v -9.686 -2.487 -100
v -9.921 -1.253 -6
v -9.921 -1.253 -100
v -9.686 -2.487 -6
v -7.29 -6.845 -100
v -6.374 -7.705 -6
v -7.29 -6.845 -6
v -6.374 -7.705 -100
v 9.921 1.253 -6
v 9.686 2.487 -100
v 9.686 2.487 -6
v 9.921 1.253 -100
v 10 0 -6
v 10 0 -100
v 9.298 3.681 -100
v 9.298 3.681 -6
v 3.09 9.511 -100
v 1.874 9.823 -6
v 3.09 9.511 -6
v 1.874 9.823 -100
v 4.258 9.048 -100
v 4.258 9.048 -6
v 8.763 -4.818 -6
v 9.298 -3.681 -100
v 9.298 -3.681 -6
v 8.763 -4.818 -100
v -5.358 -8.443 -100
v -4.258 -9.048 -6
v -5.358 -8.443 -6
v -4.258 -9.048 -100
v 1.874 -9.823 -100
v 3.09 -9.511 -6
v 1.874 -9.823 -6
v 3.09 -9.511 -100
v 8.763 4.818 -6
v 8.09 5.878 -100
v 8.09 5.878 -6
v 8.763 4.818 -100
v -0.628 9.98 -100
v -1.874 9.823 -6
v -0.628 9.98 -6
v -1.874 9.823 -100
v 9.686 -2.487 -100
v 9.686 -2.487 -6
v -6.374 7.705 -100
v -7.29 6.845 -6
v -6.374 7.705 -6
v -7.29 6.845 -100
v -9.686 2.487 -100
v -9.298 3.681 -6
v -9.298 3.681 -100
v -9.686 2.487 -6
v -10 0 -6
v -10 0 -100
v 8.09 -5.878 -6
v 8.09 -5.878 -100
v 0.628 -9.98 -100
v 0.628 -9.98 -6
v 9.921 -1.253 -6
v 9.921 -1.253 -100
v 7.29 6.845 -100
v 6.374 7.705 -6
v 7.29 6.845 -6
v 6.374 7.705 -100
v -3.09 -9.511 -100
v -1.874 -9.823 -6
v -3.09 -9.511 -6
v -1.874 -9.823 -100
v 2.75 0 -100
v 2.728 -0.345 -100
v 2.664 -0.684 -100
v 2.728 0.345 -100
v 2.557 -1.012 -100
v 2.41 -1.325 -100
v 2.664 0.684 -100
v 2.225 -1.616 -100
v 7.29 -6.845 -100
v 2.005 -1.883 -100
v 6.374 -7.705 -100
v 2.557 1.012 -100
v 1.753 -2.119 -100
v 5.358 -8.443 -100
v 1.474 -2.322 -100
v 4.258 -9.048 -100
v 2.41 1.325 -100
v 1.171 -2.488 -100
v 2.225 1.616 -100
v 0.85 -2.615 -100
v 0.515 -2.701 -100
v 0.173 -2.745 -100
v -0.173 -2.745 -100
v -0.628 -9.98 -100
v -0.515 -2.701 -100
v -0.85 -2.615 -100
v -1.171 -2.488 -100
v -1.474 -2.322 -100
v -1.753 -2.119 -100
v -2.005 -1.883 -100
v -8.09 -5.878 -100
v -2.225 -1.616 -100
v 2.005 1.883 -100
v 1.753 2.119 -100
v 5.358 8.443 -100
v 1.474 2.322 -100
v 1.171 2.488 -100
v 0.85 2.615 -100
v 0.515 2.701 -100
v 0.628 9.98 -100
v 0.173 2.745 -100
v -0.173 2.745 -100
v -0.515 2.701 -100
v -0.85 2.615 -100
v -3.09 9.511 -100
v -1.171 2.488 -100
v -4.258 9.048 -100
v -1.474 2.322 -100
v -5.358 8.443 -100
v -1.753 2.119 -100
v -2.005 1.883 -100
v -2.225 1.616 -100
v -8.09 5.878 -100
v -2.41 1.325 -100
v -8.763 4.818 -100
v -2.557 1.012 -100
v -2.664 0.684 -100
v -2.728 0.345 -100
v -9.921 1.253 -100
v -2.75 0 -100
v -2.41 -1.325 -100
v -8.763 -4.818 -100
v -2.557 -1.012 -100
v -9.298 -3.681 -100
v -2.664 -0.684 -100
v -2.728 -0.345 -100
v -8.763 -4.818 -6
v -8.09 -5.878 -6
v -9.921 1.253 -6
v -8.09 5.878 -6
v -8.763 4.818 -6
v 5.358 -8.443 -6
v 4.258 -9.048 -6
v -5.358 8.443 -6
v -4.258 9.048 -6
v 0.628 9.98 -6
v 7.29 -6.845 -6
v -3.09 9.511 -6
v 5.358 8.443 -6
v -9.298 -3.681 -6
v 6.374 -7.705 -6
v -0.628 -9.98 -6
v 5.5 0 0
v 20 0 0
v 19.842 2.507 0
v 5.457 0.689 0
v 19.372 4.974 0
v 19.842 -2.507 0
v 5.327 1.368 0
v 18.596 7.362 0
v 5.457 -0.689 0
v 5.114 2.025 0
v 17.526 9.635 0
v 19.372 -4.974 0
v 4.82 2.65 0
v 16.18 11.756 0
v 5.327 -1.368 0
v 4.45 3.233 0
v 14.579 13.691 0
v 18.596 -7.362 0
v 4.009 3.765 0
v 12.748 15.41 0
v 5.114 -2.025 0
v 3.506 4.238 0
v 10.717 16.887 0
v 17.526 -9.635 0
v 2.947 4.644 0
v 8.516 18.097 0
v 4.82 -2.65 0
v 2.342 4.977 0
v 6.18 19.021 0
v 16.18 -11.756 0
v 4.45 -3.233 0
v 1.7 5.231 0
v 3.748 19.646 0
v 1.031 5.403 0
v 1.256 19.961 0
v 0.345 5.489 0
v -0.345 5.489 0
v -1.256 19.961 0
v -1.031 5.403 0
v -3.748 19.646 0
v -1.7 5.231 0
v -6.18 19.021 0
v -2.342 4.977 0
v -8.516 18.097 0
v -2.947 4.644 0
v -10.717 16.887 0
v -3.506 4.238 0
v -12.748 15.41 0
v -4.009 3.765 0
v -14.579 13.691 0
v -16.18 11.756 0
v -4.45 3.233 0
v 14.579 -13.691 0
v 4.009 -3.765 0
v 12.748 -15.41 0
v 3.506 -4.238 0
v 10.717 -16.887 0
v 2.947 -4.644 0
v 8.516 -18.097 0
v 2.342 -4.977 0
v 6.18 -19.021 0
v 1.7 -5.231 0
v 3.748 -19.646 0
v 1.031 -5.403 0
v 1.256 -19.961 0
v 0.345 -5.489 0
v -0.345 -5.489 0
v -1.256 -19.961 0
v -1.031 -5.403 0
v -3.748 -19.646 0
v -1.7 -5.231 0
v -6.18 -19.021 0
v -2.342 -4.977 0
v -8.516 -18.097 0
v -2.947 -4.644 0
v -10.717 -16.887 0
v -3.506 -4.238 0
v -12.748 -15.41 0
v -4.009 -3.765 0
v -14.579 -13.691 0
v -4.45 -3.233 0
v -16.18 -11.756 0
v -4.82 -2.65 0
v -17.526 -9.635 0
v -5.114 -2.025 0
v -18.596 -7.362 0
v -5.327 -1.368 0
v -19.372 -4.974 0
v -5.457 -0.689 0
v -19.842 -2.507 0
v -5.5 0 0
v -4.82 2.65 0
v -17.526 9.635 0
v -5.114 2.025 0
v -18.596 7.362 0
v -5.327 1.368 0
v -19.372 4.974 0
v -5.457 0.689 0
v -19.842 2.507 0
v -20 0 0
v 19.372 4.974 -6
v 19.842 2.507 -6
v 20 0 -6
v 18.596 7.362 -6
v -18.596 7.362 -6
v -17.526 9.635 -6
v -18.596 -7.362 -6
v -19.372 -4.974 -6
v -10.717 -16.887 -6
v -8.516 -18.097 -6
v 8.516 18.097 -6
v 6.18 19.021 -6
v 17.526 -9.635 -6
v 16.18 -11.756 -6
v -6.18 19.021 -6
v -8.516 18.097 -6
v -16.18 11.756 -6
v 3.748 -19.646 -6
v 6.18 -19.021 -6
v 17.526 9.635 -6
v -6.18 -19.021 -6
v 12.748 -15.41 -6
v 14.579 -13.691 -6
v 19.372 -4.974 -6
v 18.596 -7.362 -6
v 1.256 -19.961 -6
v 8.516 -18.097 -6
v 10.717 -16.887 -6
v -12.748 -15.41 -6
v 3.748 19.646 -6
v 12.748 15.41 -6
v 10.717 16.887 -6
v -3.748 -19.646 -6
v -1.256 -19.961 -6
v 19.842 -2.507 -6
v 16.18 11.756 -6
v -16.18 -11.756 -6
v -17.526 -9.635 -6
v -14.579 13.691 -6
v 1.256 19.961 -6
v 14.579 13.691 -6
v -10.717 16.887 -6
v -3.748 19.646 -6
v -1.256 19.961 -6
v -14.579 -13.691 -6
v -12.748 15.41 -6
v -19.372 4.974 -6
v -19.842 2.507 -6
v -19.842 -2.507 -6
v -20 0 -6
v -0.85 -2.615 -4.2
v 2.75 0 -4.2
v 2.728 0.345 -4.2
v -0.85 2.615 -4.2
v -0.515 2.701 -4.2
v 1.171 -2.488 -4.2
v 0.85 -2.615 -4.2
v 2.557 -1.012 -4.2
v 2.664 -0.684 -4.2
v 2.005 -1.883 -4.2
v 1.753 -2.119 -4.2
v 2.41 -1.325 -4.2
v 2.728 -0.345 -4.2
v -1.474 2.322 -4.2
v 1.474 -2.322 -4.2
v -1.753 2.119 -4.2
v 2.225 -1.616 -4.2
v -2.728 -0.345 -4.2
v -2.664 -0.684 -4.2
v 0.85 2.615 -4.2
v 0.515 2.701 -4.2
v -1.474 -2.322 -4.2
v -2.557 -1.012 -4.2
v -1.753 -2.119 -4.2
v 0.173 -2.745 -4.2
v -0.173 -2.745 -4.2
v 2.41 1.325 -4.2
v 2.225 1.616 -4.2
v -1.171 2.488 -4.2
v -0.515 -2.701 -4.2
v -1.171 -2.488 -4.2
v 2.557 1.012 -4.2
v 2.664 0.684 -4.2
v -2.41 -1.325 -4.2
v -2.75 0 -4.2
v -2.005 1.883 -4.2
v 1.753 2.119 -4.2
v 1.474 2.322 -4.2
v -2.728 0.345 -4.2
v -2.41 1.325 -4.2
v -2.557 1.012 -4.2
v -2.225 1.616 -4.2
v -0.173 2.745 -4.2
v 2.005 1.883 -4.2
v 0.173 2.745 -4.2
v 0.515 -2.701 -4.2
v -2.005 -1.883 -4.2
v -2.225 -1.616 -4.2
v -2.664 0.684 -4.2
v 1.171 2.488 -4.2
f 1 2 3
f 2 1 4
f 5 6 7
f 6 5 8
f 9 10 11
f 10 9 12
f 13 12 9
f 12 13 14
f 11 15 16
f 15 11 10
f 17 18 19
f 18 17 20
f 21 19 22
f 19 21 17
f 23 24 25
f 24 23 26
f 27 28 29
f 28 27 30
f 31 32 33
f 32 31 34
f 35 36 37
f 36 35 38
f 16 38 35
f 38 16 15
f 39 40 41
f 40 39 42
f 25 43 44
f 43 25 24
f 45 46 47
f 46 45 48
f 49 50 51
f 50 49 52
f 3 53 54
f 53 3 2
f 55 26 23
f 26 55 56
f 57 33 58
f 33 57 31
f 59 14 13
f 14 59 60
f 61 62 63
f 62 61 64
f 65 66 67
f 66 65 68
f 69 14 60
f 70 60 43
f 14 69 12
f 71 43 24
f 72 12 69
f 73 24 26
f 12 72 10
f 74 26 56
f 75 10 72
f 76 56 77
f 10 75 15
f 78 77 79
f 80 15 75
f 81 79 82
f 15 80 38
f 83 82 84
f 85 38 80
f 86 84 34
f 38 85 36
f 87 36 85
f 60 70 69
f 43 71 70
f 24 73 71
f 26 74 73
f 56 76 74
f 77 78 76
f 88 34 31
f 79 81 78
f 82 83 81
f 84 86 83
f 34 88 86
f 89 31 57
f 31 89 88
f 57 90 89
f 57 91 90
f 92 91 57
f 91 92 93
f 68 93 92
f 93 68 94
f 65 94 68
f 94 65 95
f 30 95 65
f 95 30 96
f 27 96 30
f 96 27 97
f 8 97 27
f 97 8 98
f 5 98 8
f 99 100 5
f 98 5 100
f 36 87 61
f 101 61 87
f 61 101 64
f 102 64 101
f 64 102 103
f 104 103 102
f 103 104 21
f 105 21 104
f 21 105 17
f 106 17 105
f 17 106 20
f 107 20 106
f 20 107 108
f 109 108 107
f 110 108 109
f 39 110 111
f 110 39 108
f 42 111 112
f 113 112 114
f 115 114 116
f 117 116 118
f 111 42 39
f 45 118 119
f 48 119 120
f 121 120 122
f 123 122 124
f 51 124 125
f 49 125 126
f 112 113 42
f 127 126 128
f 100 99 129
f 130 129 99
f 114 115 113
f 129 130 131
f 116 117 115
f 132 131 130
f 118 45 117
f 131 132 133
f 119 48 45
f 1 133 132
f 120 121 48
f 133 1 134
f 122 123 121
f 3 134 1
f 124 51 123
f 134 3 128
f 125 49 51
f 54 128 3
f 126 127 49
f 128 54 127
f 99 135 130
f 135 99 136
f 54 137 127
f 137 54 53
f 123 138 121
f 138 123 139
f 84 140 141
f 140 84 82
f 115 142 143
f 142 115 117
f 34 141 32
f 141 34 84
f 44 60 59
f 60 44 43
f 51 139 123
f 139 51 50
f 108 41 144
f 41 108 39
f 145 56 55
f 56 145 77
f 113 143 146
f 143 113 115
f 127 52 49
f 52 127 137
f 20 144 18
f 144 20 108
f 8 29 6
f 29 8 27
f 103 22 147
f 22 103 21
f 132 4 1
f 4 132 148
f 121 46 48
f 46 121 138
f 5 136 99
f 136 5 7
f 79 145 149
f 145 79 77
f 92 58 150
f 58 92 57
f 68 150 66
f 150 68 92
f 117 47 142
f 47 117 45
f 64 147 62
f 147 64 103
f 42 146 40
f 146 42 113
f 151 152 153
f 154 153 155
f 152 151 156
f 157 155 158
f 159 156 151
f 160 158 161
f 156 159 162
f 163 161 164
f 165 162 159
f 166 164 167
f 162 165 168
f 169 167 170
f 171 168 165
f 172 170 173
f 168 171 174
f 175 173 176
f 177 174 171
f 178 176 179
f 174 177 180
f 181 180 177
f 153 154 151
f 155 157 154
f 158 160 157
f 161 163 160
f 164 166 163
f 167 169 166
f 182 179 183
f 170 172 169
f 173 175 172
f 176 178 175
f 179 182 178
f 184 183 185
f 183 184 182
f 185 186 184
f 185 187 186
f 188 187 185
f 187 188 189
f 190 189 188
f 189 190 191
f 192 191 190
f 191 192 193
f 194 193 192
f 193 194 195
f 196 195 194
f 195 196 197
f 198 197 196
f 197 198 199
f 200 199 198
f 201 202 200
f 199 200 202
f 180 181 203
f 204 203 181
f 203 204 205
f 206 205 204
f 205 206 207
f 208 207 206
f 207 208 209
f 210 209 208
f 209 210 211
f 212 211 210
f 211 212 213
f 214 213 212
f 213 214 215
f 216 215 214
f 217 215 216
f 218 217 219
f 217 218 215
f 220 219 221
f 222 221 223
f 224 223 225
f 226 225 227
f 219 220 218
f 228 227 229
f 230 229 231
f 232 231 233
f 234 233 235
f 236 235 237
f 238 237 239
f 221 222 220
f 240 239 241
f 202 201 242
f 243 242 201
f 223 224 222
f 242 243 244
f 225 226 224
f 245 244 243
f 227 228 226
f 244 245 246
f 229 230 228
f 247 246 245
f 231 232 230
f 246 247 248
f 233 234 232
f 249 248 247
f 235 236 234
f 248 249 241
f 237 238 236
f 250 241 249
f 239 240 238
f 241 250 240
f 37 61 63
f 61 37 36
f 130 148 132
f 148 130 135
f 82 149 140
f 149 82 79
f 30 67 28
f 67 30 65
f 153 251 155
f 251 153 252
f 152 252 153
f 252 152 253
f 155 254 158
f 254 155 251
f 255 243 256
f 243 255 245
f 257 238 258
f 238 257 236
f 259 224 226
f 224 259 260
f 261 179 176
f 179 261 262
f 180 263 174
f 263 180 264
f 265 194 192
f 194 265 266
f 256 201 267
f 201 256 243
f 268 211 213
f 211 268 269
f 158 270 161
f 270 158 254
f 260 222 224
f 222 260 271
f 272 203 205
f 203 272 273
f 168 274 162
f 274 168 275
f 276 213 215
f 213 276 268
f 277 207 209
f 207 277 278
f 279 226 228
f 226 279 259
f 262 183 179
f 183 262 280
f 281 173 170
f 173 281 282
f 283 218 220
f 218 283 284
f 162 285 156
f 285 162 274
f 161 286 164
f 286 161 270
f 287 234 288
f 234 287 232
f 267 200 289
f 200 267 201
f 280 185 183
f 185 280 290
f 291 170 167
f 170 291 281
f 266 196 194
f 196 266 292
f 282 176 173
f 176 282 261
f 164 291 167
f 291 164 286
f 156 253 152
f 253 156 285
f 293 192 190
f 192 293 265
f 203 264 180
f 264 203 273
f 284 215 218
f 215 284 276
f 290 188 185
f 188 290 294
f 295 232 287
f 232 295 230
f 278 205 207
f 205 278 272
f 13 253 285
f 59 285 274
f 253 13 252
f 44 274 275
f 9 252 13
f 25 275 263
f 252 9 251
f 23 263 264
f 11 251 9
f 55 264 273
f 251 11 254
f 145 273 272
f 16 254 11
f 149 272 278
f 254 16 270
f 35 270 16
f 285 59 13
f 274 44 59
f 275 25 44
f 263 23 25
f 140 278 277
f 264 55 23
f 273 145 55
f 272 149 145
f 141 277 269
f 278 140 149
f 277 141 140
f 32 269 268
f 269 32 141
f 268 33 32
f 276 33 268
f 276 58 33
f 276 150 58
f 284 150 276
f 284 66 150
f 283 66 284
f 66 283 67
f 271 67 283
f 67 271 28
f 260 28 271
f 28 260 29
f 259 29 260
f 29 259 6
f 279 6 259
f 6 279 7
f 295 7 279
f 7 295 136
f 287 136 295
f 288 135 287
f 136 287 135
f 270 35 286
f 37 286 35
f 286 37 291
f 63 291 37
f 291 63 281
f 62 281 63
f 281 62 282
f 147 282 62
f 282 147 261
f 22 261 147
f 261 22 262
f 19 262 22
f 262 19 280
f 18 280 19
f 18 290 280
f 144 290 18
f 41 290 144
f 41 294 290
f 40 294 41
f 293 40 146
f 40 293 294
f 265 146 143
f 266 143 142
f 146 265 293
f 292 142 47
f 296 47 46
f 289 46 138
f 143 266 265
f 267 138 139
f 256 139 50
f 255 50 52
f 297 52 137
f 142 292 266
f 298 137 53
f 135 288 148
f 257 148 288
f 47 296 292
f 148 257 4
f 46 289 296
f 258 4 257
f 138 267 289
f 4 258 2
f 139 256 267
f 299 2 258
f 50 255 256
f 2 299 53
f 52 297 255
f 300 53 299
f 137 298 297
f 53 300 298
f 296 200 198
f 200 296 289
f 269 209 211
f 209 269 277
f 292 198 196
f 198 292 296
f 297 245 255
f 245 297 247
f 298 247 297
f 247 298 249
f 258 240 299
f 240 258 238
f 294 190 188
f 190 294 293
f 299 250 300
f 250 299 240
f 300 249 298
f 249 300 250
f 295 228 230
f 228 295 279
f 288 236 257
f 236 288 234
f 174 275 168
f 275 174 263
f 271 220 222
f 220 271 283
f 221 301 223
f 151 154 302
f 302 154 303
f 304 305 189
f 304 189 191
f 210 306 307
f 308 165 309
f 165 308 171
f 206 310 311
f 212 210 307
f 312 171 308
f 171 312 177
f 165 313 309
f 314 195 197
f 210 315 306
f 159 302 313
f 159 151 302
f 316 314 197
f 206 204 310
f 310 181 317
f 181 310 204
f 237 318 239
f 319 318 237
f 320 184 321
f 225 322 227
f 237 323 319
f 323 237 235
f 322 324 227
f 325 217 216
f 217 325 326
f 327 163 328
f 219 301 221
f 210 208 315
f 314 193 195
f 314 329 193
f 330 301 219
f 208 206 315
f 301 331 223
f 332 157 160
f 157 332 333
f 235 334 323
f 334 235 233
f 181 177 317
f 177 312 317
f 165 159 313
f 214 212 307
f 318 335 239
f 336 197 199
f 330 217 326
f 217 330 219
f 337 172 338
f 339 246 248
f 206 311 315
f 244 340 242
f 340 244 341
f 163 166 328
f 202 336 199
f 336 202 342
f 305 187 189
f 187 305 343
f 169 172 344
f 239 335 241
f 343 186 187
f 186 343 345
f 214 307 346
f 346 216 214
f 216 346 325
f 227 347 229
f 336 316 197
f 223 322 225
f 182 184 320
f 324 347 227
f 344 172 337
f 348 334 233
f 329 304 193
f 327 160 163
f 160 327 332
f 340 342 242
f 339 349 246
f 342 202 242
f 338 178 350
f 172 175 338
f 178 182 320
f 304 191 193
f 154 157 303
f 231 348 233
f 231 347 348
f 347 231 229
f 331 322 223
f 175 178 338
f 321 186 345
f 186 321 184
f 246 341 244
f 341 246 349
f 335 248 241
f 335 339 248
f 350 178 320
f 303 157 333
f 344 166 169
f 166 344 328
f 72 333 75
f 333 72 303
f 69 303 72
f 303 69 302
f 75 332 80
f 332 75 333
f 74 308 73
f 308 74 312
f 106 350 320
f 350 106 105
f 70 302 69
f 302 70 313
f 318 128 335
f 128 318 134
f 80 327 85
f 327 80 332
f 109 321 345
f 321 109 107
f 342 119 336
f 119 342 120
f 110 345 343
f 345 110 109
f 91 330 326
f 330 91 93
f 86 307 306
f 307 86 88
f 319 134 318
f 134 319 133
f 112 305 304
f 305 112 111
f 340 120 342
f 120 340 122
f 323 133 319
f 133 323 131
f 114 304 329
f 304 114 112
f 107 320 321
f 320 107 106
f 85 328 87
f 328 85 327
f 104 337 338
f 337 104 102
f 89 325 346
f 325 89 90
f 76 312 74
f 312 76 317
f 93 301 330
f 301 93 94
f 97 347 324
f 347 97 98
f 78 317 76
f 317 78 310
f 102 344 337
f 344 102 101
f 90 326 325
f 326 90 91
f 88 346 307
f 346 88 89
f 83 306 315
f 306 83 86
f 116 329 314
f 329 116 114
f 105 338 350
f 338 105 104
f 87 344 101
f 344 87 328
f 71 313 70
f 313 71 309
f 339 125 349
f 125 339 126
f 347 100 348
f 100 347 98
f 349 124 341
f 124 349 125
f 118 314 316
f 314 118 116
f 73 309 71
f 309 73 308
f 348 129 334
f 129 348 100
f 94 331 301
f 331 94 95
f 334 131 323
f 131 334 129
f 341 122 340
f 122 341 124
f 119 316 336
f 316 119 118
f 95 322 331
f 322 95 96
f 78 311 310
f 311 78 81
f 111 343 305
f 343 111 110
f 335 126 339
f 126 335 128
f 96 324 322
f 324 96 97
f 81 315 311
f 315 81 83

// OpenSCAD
$fn = 50;


difference() {
	union() {
		translate(v = [0, 0, -100.0000000000]) {
			cylinder(h = 100, r = 10.0000000000);
		}
		translate(v = [0, 0, -6.0000000000]) {
			cylinder(h = 6, r = 20.0000000000);
		}
	}
	union() {
		translate(v = [0, 0, 0]) {
			rotate(a = [0, 0, 0]) {
				difference() {
					union() {
						#translate(v = [0, 0, -100.0000000000]) {
							cylinder(h = 100, r = 2.2500000000);
						}
						#translate(v = [0, 0, -4.2000000000]) {
							cylinder(h = 4.2000000000, r = 10.0000000000, r1 = 2.7500000000, r2 = 5.5000000000);
						}
						#translate(v = [0, 0, -100.0000000000]) {
							cylinder(h = 100, r = 2.7500000000);
						}
						#translate(v = [0, 0, -100.0000000000]) {
							cylinder(h = 100, r = 2.2500000000);
						}
					}
					union();
				}
			}
		}
	}
}
